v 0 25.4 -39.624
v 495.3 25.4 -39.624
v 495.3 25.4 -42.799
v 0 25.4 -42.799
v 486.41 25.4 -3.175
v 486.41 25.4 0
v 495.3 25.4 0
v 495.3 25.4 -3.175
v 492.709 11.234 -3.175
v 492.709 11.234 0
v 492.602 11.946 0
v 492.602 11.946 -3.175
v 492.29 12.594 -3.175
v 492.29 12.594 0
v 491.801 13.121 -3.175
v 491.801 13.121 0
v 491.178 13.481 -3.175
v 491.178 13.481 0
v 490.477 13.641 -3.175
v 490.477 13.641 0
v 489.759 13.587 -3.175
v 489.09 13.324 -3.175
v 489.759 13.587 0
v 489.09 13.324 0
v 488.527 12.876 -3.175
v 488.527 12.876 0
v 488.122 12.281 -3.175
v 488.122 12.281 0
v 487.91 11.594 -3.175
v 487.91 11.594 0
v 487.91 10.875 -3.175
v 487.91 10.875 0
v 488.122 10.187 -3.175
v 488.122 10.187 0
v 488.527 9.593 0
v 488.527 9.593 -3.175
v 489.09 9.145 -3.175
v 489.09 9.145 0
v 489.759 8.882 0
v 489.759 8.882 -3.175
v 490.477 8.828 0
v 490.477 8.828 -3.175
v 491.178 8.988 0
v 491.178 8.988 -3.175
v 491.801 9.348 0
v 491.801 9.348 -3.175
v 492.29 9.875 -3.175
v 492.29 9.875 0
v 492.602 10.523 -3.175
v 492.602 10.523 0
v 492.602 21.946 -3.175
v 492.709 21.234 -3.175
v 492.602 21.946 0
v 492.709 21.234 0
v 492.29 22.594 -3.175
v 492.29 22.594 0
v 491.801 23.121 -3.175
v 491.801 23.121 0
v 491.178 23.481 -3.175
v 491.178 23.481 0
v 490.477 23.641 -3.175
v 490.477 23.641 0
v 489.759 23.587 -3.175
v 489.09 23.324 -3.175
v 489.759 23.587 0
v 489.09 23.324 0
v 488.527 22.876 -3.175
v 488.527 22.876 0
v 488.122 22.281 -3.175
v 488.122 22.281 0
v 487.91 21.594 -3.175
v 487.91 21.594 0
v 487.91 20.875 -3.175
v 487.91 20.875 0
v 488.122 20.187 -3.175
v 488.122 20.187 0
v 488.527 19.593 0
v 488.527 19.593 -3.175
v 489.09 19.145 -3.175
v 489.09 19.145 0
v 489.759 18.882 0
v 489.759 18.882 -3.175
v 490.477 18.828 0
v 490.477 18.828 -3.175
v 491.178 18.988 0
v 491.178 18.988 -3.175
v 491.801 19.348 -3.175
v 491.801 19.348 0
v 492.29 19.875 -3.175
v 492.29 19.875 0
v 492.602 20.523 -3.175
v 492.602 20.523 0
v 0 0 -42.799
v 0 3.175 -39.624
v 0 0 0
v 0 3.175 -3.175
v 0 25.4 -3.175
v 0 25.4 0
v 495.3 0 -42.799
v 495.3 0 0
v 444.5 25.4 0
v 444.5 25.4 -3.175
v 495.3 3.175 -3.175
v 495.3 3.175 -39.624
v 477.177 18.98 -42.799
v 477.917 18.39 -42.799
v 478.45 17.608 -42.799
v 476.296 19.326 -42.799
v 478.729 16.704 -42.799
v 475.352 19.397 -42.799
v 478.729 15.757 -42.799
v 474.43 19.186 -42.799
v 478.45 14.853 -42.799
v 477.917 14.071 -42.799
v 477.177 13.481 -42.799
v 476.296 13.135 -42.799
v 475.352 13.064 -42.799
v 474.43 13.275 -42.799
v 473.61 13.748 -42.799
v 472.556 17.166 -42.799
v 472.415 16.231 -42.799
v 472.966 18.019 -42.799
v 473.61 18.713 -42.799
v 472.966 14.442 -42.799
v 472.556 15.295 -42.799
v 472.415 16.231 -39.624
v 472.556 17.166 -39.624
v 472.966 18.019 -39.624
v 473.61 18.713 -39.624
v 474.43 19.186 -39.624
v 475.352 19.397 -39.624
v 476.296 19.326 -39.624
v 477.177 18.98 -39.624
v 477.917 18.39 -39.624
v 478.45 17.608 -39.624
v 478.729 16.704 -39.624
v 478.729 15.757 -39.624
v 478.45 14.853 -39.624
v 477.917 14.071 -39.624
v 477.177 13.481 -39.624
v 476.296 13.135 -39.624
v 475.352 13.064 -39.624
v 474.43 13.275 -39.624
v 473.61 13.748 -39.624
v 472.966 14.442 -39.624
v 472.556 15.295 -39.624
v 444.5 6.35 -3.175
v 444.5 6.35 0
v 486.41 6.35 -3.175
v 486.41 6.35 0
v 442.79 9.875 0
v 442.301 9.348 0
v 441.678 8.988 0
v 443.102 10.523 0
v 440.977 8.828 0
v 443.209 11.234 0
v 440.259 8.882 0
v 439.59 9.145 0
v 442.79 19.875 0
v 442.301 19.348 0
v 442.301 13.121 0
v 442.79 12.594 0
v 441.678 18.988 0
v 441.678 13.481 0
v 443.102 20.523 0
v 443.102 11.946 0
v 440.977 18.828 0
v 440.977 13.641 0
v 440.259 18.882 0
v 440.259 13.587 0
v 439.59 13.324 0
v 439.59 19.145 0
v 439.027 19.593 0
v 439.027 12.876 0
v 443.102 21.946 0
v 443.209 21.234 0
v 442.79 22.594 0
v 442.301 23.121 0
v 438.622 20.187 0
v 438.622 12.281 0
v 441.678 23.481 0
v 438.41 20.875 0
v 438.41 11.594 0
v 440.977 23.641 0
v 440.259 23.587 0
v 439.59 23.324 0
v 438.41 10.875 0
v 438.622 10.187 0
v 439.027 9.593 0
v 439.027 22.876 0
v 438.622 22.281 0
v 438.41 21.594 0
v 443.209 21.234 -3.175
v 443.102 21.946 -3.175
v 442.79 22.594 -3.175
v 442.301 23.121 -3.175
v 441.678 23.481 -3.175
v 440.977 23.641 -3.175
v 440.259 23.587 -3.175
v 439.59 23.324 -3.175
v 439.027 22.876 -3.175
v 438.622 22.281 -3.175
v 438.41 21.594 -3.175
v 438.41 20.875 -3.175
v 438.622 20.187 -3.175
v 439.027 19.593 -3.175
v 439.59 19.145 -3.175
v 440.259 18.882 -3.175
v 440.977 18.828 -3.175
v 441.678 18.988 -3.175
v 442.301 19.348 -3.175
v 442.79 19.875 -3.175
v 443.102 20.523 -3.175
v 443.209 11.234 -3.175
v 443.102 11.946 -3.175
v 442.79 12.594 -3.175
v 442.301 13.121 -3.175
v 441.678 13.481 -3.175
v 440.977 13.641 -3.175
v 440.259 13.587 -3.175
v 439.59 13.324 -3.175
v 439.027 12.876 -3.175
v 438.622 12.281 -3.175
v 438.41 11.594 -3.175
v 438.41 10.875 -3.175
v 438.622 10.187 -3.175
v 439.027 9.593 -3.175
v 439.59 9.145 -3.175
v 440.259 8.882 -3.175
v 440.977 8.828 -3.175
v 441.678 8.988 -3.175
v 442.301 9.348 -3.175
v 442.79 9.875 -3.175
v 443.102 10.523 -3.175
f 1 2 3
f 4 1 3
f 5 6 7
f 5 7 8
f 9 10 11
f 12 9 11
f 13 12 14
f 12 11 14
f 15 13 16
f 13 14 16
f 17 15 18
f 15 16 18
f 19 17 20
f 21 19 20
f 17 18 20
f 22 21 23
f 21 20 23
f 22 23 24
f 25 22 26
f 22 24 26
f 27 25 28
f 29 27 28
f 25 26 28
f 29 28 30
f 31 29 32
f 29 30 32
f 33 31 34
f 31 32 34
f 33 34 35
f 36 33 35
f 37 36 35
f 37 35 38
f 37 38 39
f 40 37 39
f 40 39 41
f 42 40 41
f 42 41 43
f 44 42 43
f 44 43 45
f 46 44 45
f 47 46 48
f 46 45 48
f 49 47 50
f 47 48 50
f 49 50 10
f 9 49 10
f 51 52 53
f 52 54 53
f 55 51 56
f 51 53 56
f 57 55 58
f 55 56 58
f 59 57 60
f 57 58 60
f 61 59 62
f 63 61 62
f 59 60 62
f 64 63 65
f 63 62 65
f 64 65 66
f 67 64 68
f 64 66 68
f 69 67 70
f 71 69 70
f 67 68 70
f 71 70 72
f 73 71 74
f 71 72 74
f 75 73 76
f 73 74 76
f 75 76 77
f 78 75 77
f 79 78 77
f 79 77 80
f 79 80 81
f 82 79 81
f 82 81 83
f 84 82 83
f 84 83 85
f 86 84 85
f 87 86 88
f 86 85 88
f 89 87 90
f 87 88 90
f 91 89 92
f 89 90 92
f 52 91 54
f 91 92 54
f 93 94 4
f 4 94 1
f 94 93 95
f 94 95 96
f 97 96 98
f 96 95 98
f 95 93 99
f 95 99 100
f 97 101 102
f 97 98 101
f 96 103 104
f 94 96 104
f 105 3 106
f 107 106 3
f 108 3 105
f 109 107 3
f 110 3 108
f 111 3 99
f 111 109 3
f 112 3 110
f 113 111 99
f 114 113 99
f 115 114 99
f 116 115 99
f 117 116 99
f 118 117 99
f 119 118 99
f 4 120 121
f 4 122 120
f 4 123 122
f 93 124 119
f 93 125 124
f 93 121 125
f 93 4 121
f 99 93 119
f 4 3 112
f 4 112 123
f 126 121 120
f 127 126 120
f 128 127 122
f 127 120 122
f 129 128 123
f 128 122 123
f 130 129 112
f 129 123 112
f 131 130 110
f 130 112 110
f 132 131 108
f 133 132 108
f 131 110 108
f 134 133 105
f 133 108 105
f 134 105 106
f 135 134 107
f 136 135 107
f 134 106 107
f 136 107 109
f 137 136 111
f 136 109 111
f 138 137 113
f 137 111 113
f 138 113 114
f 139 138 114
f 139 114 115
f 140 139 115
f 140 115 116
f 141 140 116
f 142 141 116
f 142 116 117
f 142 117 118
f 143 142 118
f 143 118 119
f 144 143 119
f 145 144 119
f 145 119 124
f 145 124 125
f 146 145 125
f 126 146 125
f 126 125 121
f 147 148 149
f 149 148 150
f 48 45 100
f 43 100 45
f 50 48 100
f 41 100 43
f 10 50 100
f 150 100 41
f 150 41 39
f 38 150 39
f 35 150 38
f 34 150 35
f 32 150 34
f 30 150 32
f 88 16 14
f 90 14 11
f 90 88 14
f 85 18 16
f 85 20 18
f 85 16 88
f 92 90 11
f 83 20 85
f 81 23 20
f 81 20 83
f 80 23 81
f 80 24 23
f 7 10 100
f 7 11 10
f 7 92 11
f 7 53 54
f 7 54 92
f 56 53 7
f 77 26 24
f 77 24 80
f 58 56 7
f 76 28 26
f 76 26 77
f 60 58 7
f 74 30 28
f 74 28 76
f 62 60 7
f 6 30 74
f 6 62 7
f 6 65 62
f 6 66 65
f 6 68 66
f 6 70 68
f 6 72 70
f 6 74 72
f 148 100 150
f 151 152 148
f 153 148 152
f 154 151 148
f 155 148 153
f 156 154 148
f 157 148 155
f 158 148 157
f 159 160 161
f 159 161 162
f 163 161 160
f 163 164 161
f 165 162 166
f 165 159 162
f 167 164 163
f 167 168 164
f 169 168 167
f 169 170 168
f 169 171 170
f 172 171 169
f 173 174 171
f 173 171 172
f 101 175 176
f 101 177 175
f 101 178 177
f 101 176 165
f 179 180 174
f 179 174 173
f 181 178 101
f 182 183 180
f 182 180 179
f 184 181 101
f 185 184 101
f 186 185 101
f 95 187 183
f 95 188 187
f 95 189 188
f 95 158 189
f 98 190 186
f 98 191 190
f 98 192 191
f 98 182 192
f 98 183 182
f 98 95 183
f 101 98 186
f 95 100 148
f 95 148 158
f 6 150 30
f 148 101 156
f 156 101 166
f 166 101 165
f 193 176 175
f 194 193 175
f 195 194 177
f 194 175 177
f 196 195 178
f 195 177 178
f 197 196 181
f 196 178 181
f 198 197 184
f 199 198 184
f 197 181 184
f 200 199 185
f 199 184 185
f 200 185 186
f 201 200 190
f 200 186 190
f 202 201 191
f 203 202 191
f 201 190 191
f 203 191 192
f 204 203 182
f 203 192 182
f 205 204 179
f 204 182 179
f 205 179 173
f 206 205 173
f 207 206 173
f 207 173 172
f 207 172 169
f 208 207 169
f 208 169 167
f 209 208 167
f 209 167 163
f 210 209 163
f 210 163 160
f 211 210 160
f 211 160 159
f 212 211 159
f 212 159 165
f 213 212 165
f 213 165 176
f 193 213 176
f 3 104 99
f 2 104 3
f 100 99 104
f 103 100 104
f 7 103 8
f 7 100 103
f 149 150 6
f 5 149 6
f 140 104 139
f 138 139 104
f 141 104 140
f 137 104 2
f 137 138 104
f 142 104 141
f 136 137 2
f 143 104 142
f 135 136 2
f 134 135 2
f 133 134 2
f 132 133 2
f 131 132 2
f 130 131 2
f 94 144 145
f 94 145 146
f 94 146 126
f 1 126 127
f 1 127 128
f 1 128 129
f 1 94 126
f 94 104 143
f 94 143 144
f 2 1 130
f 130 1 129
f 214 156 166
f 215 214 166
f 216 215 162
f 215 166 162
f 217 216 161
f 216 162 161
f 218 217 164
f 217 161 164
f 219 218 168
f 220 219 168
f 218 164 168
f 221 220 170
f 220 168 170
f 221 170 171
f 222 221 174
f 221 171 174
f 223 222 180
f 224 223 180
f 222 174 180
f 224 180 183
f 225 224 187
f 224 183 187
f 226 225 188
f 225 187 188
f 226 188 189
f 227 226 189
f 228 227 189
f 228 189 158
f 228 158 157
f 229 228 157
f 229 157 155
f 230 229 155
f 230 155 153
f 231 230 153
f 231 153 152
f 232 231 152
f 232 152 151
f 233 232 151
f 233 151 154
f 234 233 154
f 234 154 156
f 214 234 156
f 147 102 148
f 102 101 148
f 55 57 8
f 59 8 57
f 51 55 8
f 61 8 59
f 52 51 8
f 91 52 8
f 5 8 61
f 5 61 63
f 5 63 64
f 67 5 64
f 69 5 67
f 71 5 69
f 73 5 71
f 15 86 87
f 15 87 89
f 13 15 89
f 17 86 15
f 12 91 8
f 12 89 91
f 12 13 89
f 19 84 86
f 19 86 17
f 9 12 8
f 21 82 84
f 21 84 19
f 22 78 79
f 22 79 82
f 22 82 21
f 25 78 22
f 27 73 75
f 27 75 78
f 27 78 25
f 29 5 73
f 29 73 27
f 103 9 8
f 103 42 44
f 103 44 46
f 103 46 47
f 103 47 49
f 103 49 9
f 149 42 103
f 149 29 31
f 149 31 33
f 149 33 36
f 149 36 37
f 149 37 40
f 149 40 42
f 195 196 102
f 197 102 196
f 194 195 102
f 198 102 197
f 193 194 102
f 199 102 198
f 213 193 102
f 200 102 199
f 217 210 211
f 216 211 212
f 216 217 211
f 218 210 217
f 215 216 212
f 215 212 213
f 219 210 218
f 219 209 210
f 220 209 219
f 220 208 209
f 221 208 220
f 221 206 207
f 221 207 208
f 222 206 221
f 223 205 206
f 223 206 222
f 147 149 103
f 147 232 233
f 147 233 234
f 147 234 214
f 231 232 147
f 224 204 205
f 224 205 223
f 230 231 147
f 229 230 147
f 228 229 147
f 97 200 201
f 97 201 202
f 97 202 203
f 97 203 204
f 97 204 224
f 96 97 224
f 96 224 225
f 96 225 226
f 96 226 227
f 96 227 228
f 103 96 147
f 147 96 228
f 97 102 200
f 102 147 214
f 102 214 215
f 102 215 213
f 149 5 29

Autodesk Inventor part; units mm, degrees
ref_plane "YZ Plane" through (0, 0, 0) normal (1, 0, 0) x (0, 1, 0)
ref_plane "XZ Plane" through (0, 0, 0) normal (0, 1, 0) x (-1, 0, 0)
ref_plane "XY Plane" through (0, 0, 0) normal (0, 0, 1) x (1, 0, 0)
sketch "Sketch1" plane through (0, 0, 0) normal (1, 0, 0) x (0, 1, 0)
  line L0 (0, 0) -> (25.4, 0)
  line L1 (25.4, 0) -> (25.4, -42.799)
  line L2 (25.4, -42.799) -> (0, -42.799)
  line L3 (0, -42.799) -> (0, 0)
  line L4 (25.4, -3.175) -> (3.175, -3.175)
  line L5 (3.175, -3.175) -> (3.175, -39.624)
  line L6 (3.175, -39.624) -> (25.4, -39.624)
  line L7 (25.4, -39.624) -> (25.4, -3.175)
  dimension "d0" = 25.4
  dimension "d1" = 42.799
  dimension "d2" = 22.225
  dimension "d3" = 36.449
  dimension "d4" = 3.175
extrude "Extrusion1" add sketch "Sketch1" along normal blind 495.3 contours L0 L1 L4 L5 L6 L2 L3
sketch "Sketch2" plane through (0, 0, 0) normal (0, 0, 1) x (1, 0, 0)
  line L0 (0, 25.4) -> (0, 0) projected
  line L1 (0, 0) -> (495.3, 0) projected
  line L2 (495.3, 25.4) -> (495.3, 0) projected
  line L3 (0, 25.4) -> (495.3, 25.4) projected
  line L4 (486.41, 25.4) -> (444.5, 25.4)
  line L5 (444.5, 25.4) -> (444.5, 6.35)
  line L6 (444.5, 6.35) -> (486.41, 6.35)
  line L7 (486.41, 6.35) -> (486.41, 25.4)
  circle A0 centre (490.2962, 21.2344) radius 2.413
  circle A1 centre (490.2962, 11.2344) radius 2.413
  circle A2 centre (440.7962, 21.2344) radius 2.413
  circle A3 centre (440.7962, 11.2344) radius 2.413
  dimension "d7" = 8.89
  dimension "d8" = 25.4
  dimension "d9" = 19.05
  dimension "d10" = 50.8
  dimension "d11" = 4.826
  dimension "d12" = 4.826
  dimension "d13" = 4.1656
  dimension "d14" = 10
  dimension "d15" = 4.826
  dimension "d16" = 4.826
  dimension "d26" = 5.0038
  dimension "d27" = 5.0038
  dimension "d28" = 49.5
  dimension "d29" = 49.5
  dimension "d30" = 10
extrude "Extrusion2" cut sketch "Sketch2" against normal blind 12.7 contours L3 L7 L6 L5 | A0 | A1 | A2 | A3
sketch "Sketch3" plane through (0, 0, -42.799) normal (0, 0, -1) x (-1, 0, 0)
  line L0 (0, 0) -> (0, 25.4) projected
  line L1 (0, 25.4) -> (-495.3, 25.4) projected
  line L2 (-495.3, 0) -> (-495.3, 25.4) projected
  line L3 (0, 0) -> (-495.3, 0) projected
  circle A0 centre (-475.5896, 16.2306) radius 3.175
  point P0 (0, 0)
  dimension "d21" = 6.35
  dimension "d22" = 19.7104
  dimension "d23" = 9.1694
extrude "Extrusion3" cut sketch "Sketch3" against normal blind 12.7 contours A0
equation "\"d12\" = d11"
equation "\"d15\" = d11"
equation "\"d16\" = d11"
equation "\"d27\" = d26"
equation "\"d29\" = d28"
equation "\"d30\" = d14"
properties part number "ArmProto1.2"
